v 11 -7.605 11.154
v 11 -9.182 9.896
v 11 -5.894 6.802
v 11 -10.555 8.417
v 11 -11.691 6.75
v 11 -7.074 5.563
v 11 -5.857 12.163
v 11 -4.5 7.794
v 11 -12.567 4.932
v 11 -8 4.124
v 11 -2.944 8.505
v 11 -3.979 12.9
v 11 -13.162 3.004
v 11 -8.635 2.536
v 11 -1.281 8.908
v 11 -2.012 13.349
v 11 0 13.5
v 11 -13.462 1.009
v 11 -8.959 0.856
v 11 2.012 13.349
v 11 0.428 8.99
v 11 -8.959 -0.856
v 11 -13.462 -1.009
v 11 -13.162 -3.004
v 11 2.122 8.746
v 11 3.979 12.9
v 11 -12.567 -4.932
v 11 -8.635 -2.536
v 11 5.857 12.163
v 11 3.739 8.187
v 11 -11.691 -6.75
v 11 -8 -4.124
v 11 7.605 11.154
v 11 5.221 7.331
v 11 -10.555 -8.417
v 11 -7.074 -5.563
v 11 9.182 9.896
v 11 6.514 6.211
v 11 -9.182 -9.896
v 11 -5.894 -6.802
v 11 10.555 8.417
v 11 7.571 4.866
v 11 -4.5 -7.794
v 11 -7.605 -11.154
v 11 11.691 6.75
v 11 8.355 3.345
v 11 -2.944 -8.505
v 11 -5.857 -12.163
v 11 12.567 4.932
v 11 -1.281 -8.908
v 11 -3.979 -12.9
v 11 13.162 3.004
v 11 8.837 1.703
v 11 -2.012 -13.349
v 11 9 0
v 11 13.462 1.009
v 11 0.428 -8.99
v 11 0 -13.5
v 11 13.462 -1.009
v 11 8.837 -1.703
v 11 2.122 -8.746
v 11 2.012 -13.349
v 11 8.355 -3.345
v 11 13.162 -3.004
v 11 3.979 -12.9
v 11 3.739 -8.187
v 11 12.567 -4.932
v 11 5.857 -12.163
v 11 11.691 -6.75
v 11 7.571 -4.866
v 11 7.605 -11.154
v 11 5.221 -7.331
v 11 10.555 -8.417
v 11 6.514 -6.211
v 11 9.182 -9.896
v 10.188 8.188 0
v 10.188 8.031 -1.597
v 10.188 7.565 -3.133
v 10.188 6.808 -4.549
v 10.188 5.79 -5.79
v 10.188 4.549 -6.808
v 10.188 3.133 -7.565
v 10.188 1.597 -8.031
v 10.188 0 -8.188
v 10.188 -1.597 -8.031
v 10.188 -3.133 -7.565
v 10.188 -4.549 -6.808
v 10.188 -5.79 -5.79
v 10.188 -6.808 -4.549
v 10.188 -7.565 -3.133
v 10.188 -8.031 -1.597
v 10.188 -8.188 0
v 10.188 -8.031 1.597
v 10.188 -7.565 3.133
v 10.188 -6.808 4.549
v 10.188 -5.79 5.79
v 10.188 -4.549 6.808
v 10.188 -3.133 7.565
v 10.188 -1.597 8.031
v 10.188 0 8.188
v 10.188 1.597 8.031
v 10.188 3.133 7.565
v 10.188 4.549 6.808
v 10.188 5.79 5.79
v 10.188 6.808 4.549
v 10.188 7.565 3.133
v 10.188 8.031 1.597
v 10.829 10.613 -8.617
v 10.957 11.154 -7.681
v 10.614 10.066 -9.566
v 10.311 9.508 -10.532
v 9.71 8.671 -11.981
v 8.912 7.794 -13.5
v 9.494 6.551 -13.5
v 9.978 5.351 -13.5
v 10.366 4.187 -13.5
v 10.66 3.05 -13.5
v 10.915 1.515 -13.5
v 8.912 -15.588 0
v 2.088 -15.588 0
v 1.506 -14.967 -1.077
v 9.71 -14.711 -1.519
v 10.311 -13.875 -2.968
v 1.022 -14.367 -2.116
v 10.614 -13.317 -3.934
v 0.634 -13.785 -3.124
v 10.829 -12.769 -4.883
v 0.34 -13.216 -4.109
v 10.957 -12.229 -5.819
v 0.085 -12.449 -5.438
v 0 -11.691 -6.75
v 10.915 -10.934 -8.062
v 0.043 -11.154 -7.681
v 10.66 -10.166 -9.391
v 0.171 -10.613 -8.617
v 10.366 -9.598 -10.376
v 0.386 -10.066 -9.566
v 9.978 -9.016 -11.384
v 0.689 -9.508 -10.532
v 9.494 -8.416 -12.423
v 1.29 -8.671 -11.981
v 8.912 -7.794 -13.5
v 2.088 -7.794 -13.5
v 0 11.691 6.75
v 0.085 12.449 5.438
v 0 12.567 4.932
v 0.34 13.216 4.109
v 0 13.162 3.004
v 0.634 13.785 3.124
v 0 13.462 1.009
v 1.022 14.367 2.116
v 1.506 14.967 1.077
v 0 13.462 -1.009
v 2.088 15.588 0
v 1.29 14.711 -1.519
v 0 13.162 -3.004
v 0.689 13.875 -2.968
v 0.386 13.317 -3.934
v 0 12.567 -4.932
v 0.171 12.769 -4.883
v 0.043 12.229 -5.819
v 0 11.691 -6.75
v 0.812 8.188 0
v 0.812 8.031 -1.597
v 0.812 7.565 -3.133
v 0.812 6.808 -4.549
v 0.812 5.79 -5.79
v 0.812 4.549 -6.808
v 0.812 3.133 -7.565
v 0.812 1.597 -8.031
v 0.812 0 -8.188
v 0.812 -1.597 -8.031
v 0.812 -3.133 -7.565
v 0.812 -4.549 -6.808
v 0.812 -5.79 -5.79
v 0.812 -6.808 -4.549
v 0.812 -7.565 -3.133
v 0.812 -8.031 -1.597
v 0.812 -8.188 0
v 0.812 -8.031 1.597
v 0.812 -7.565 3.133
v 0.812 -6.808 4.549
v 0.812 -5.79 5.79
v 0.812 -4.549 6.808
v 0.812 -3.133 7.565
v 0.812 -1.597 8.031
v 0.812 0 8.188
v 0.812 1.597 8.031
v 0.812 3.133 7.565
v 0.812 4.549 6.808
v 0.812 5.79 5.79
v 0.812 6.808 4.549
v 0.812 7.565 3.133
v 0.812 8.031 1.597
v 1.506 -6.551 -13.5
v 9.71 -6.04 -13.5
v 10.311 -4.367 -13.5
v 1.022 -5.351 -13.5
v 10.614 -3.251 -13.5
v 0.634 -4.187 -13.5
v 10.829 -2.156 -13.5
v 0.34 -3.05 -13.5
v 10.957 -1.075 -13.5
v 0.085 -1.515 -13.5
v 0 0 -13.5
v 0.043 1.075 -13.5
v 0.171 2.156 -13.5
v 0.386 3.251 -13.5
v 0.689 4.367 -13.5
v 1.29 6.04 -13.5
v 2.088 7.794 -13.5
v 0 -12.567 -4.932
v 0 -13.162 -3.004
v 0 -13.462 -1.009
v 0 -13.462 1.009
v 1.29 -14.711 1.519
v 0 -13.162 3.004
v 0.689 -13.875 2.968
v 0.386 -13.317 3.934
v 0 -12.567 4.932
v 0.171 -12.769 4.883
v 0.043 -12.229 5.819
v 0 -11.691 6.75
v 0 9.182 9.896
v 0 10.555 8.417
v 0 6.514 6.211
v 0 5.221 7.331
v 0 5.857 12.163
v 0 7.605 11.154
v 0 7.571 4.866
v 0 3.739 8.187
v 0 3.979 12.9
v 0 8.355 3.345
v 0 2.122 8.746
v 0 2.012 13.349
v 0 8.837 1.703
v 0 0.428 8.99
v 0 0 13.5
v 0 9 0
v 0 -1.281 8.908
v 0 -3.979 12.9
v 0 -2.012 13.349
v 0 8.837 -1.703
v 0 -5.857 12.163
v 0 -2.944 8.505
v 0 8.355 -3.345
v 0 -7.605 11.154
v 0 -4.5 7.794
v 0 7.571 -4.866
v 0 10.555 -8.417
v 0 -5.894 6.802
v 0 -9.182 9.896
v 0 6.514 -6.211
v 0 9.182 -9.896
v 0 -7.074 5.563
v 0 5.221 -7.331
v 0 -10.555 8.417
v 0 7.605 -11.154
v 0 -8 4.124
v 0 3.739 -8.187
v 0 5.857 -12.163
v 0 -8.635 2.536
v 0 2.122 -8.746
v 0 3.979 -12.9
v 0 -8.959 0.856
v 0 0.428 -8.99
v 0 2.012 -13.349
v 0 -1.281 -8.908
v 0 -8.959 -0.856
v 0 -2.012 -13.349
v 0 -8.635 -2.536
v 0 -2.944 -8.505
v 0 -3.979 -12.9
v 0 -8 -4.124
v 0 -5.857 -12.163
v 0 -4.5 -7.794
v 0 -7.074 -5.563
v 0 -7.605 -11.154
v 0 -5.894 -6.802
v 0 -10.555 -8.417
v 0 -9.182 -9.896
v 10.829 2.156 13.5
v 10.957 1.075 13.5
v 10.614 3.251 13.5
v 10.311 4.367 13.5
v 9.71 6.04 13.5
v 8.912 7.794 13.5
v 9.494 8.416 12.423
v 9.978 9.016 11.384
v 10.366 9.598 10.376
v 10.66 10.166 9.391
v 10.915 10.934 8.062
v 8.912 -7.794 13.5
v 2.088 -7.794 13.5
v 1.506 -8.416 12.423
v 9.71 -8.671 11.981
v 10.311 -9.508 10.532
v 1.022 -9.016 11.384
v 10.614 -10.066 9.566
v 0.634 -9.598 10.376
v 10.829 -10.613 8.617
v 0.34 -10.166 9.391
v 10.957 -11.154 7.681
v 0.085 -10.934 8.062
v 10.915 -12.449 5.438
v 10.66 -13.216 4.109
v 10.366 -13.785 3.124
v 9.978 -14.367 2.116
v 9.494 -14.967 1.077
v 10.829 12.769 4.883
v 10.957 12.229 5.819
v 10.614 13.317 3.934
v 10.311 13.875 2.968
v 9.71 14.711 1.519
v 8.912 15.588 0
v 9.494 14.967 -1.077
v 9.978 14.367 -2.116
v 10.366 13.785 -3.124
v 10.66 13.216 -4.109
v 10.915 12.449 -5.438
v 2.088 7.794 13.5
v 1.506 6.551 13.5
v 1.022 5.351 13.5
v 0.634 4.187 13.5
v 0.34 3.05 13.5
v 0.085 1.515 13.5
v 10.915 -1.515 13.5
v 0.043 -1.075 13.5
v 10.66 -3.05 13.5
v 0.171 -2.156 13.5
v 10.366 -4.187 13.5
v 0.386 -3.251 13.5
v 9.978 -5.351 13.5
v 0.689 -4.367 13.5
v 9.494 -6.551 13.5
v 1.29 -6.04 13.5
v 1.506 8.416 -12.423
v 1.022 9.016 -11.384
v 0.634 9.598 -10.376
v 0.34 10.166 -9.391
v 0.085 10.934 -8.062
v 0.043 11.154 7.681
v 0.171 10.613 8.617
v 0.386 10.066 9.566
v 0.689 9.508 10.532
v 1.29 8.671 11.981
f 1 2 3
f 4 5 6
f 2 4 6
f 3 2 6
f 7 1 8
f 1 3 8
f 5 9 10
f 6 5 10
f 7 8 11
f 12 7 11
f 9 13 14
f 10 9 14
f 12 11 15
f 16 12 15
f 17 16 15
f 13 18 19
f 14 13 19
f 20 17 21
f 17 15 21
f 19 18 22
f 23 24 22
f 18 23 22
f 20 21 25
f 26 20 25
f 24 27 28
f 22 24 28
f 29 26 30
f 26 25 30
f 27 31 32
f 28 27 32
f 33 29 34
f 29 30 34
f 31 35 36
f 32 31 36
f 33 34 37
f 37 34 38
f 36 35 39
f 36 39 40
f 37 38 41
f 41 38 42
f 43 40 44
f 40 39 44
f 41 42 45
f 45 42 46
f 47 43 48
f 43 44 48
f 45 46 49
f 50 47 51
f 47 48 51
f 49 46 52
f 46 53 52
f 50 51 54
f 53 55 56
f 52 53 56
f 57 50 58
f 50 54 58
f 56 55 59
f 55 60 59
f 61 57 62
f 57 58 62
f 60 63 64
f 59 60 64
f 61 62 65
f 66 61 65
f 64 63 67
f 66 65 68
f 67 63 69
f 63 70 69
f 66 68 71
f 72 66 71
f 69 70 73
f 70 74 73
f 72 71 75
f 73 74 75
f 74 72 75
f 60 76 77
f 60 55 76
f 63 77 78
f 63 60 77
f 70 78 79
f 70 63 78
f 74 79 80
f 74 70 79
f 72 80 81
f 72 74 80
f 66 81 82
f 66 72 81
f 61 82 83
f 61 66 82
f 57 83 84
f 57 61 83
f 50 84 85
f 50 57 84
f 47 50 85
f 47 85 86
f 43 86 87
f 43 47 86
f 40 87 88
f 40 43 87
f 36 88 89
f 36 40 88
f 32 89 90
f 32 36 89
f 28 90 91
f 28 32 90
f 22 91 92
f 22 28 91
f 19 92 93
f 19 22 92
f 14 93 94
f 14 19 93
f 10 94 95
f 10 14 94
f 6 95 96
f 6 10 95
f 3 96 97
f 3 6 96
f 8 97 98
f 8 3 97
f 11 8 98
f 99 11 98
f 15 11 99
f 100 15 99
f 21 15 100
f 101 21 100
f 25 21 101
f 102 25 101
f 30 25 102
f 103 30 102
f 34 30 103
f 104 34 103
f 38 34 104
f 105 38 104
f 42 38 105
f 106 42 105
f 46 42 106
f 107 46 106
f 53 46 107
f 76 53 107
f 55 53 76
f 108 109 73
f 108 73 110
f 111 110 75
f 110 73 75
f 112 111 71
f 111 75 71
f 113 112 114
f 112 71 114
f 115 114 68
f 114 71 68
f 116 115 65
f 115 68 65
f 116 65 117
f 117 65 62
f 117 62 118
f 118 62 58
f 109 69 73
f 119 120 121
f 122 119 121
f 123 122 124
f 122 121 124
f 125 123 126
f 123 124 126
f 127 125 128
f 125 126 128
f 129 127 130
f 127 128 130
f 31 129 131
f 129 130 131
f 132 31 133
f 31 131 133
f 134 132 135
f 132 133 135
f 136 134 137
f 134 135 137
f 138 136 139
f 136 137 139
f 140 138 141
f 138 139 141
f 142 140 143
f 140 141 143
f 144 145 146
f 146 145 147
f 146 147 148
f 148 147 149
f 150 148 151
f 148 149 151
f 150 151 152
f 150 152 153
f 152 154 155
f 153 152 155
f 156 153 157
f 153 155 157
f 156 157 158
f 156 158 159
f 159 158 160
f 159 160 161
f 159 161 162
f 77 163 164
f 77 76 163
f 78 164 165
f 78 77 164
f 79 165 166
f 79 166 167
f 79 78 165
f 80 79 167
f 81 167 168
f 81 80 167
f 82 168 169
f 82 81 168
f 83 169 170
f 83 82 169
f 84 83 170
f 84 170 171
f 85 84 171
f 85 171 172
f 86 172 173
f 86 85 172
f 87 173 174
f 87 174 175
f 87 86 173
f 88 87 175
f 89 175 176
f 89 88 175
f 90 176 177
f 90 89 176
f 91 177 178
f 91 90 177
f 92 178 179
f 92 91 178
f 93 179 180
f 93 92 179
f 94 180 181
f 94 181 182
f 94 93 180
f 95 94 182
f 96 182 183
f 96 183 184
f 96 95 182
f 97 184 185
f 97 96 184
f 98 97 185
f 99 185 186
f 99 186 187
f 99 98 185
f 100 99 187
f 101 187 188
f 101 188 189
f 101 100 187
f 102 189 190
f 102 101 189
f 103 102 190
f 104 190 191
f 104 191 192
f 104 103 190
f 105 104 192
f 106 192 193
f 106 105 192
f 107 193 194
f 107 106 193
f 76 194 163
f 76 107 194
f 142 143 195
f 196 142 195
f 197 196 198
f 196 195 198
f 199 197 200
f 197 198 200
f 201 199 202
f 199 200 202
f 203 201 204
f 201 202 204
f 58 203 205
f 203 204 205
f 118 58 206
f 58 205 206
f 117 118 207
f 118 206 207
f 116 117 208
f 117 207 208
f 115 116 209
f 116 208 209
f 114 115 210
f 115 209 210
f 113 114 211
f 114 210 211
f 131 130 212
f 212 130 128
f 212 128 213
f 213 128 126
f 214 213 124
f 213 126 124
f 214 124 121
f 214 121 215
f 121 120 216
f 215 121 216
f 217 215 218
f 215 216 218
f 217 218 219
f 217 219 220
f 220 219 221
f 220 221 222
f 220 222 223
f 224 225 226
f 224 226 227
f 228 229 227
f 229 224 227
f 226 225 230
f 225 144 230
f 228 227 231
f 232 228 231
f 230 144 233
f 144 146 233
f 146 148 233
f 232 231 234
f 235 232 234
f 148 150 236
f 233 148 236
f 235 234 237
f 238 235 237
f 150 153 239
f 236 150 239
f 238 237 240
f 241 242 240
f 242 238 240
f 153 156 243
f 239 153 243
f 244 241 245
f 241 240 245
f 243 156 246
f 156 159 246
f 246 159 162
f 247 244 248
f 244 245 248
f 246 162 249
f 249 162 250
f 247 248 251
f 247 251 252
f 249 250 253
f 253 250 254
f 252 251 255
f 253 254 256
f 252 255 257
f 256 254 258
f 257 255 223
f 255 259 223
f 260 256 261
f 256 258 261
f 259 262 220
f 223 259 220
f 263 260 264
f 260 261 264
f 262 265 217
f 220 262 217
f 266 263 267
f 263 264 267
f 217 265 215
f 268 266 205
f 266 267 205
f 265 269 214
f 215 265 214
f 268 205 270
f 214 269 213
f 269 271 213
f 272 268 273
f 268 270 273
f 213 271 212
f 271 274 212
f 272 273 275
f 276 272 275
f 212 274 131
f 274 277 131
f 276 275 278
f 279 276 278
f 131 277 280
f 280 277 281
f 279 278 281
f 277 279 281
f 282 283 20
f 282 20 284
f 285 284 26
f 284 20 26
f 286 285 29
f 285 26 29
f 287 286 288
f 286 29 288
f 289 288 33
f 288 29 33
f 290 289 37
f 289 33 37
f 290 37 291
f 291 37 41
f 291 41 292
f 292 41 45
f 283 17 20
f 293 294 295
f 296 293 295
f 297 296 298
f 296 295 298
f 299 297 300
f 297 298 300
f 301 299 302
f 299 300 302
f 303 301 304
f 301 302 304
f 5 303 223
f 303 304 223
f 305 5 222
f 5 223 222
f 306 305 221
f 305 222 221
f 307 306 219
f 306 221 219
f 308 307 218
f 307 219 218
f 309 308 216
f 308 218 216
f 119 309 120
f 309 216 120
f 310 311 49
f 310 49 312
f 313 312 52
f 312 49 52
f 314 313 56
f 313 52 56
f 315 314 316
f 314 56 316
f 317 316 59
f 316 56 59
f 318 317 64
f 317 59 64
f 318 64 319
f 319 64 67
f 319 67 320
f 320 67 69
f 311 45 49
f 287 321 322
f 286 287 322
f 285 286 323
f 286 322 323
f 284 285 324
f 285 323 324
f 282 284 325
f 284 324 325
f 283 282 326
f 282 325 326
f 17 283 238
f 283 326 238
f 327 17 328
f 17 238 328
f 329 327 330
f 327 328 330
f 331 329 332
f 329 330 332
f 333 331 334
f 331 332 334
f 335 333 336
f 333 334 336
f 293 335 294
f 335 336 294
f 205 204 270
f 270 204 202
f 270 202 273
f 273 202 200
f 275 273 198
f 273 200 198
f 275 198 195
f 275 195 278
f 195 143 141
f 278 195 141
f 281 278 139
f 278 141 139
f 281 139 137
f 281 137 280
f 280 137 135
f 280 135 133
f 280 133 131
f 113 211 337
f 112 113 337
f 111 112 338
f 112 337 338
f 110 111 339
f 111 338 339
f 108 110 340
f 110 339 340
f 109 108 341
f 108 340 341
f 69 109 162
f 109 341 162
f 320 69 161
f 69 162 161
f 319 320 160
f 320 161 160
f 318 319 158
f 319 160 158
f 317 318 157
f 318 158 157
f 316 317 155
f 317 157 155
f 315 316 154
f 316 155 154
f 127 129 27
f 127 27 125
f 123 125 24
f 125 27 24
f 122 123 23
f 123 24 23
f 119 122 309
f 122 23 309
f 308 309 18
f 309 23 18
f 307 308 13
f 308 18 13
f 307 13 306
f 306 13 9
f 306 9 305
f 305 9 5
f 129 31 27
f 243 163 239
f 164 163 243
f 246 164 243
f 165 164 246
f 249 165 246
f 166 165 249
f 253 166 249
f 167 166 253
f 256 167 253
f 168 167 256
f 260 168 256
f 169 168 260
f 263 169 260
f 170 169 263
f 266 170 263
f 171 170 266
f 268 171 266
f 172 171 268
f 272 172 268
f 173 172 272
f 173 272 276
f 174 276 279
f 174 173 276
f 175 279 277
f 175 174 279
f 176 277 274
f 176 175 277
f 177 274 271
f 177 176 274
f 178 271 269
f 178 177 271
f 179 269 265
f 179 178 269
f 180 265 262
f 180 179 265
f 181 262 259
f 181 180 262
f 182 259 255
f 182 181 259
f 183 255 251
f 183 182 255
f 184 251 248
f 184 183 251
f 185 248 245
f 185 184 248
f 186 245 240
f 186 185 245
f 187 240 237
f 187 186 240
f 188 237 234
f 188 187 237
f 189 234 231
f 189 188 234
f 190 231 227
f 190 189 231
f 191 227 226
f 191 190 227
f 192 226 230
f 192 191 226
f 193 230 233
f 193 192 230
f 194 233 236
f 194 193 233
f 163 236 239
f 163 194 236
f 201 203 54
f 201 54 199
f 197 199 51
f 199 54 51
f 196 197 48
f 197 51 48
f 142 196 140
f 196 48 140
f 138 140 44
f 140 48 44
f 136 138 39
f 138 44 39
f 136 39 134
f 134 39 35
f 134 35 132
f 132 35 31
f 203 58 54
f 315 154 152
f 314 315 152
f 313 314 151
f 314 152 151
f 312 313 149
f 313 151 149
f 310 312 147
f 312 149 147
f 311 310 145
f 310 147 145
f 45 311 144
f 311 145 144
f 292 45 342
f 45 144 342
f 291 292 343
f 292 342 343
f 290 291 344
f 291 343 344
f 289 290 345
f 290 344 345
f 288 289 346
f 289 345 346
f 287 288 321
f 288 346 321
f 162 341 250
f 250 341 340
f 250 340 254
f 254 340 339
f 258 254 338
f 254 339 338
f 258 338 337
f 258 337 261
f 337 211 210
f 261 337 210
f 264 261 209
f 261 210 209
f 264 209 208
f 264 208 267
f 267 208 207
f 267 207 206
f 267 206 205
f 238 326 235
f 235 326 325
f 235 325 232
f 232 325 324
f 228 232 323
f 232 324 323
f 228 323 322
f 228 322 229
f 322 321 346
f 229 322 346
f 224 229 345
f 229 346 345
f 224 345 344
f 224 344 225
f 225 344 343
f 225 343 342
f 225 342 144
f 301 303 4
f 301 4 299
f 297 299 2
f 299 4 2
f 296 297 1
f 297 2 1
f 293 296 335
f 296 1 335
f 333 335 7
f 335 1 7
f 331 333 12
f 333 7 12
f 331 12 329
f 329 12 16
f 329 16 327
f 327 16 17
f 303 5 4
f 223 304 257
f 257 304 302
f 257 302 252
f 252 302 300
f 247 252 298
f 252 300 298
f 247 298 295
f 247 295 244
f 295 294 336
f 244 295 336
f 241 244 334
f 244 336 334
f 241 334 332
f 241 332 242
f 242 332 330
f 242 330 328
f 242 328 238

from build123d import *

# Parameters (mm, degrees)
CUT_EXTRUDE_1_DEPTH      = 54
CUT_EXTRUDE_1_DEPTH_BACK = 54
SKETCH_3_W               = 54
SKETCH_3_H               = 54


with BuildPart() as part:
    # 草图1 → 旋转1 (revolve)
    with BuildSketch(Plane.XY):
        Polygon((0, 0), (0, 13.5), (2.7, 16.2), (8.3, 16.2), (11, 13.5), (11, 0), align=None)
    revolve(axis=Axis((11, 0, 0), (-1, 0, 0)))

    # 草图2 → 切除-旋转1 (revolve, cut)
    with BuildSketch(Plane.XY):
        Polygon((0, 0), (0, 9), (0.812, 8.188), (10.188, 8.188), (11, 9), (11, 0), align=None)
    revolve(axis=Axis((11, 0, 0), (-1, 0, 0)), mode=Mode.SUBTRACT)

    # 草图3 → 切除-拉伸1 (cut, two sides: drawn at the far end of the back side and taken through both)
    with BuildSketch(Plane(origin=(0, 0, 0), x_dir=(0, 0, -1), z_dir=(1, 0, 0)).offset(-CUT_EXTRUDE_1_DEPTH_BACK)):
        Rectangle(SKETCH_3_W, SKETCH_3_H)
        Polygon((-13.5, -7.794228634), (0, -15.588457268), (13.5, -7.794228634), (13.5, 7.794228634), (0, 15.588457268), (-13.5, 7.794228634), align=None, mode=Mode.SUBTRACT)
    extrude(amount=CUT_EXTRUDE_1_DEPTH + CUT_EXTRUDE_1_DEPTH_BACK, mode=Mode.SUBTRACT)


solid = part.part
